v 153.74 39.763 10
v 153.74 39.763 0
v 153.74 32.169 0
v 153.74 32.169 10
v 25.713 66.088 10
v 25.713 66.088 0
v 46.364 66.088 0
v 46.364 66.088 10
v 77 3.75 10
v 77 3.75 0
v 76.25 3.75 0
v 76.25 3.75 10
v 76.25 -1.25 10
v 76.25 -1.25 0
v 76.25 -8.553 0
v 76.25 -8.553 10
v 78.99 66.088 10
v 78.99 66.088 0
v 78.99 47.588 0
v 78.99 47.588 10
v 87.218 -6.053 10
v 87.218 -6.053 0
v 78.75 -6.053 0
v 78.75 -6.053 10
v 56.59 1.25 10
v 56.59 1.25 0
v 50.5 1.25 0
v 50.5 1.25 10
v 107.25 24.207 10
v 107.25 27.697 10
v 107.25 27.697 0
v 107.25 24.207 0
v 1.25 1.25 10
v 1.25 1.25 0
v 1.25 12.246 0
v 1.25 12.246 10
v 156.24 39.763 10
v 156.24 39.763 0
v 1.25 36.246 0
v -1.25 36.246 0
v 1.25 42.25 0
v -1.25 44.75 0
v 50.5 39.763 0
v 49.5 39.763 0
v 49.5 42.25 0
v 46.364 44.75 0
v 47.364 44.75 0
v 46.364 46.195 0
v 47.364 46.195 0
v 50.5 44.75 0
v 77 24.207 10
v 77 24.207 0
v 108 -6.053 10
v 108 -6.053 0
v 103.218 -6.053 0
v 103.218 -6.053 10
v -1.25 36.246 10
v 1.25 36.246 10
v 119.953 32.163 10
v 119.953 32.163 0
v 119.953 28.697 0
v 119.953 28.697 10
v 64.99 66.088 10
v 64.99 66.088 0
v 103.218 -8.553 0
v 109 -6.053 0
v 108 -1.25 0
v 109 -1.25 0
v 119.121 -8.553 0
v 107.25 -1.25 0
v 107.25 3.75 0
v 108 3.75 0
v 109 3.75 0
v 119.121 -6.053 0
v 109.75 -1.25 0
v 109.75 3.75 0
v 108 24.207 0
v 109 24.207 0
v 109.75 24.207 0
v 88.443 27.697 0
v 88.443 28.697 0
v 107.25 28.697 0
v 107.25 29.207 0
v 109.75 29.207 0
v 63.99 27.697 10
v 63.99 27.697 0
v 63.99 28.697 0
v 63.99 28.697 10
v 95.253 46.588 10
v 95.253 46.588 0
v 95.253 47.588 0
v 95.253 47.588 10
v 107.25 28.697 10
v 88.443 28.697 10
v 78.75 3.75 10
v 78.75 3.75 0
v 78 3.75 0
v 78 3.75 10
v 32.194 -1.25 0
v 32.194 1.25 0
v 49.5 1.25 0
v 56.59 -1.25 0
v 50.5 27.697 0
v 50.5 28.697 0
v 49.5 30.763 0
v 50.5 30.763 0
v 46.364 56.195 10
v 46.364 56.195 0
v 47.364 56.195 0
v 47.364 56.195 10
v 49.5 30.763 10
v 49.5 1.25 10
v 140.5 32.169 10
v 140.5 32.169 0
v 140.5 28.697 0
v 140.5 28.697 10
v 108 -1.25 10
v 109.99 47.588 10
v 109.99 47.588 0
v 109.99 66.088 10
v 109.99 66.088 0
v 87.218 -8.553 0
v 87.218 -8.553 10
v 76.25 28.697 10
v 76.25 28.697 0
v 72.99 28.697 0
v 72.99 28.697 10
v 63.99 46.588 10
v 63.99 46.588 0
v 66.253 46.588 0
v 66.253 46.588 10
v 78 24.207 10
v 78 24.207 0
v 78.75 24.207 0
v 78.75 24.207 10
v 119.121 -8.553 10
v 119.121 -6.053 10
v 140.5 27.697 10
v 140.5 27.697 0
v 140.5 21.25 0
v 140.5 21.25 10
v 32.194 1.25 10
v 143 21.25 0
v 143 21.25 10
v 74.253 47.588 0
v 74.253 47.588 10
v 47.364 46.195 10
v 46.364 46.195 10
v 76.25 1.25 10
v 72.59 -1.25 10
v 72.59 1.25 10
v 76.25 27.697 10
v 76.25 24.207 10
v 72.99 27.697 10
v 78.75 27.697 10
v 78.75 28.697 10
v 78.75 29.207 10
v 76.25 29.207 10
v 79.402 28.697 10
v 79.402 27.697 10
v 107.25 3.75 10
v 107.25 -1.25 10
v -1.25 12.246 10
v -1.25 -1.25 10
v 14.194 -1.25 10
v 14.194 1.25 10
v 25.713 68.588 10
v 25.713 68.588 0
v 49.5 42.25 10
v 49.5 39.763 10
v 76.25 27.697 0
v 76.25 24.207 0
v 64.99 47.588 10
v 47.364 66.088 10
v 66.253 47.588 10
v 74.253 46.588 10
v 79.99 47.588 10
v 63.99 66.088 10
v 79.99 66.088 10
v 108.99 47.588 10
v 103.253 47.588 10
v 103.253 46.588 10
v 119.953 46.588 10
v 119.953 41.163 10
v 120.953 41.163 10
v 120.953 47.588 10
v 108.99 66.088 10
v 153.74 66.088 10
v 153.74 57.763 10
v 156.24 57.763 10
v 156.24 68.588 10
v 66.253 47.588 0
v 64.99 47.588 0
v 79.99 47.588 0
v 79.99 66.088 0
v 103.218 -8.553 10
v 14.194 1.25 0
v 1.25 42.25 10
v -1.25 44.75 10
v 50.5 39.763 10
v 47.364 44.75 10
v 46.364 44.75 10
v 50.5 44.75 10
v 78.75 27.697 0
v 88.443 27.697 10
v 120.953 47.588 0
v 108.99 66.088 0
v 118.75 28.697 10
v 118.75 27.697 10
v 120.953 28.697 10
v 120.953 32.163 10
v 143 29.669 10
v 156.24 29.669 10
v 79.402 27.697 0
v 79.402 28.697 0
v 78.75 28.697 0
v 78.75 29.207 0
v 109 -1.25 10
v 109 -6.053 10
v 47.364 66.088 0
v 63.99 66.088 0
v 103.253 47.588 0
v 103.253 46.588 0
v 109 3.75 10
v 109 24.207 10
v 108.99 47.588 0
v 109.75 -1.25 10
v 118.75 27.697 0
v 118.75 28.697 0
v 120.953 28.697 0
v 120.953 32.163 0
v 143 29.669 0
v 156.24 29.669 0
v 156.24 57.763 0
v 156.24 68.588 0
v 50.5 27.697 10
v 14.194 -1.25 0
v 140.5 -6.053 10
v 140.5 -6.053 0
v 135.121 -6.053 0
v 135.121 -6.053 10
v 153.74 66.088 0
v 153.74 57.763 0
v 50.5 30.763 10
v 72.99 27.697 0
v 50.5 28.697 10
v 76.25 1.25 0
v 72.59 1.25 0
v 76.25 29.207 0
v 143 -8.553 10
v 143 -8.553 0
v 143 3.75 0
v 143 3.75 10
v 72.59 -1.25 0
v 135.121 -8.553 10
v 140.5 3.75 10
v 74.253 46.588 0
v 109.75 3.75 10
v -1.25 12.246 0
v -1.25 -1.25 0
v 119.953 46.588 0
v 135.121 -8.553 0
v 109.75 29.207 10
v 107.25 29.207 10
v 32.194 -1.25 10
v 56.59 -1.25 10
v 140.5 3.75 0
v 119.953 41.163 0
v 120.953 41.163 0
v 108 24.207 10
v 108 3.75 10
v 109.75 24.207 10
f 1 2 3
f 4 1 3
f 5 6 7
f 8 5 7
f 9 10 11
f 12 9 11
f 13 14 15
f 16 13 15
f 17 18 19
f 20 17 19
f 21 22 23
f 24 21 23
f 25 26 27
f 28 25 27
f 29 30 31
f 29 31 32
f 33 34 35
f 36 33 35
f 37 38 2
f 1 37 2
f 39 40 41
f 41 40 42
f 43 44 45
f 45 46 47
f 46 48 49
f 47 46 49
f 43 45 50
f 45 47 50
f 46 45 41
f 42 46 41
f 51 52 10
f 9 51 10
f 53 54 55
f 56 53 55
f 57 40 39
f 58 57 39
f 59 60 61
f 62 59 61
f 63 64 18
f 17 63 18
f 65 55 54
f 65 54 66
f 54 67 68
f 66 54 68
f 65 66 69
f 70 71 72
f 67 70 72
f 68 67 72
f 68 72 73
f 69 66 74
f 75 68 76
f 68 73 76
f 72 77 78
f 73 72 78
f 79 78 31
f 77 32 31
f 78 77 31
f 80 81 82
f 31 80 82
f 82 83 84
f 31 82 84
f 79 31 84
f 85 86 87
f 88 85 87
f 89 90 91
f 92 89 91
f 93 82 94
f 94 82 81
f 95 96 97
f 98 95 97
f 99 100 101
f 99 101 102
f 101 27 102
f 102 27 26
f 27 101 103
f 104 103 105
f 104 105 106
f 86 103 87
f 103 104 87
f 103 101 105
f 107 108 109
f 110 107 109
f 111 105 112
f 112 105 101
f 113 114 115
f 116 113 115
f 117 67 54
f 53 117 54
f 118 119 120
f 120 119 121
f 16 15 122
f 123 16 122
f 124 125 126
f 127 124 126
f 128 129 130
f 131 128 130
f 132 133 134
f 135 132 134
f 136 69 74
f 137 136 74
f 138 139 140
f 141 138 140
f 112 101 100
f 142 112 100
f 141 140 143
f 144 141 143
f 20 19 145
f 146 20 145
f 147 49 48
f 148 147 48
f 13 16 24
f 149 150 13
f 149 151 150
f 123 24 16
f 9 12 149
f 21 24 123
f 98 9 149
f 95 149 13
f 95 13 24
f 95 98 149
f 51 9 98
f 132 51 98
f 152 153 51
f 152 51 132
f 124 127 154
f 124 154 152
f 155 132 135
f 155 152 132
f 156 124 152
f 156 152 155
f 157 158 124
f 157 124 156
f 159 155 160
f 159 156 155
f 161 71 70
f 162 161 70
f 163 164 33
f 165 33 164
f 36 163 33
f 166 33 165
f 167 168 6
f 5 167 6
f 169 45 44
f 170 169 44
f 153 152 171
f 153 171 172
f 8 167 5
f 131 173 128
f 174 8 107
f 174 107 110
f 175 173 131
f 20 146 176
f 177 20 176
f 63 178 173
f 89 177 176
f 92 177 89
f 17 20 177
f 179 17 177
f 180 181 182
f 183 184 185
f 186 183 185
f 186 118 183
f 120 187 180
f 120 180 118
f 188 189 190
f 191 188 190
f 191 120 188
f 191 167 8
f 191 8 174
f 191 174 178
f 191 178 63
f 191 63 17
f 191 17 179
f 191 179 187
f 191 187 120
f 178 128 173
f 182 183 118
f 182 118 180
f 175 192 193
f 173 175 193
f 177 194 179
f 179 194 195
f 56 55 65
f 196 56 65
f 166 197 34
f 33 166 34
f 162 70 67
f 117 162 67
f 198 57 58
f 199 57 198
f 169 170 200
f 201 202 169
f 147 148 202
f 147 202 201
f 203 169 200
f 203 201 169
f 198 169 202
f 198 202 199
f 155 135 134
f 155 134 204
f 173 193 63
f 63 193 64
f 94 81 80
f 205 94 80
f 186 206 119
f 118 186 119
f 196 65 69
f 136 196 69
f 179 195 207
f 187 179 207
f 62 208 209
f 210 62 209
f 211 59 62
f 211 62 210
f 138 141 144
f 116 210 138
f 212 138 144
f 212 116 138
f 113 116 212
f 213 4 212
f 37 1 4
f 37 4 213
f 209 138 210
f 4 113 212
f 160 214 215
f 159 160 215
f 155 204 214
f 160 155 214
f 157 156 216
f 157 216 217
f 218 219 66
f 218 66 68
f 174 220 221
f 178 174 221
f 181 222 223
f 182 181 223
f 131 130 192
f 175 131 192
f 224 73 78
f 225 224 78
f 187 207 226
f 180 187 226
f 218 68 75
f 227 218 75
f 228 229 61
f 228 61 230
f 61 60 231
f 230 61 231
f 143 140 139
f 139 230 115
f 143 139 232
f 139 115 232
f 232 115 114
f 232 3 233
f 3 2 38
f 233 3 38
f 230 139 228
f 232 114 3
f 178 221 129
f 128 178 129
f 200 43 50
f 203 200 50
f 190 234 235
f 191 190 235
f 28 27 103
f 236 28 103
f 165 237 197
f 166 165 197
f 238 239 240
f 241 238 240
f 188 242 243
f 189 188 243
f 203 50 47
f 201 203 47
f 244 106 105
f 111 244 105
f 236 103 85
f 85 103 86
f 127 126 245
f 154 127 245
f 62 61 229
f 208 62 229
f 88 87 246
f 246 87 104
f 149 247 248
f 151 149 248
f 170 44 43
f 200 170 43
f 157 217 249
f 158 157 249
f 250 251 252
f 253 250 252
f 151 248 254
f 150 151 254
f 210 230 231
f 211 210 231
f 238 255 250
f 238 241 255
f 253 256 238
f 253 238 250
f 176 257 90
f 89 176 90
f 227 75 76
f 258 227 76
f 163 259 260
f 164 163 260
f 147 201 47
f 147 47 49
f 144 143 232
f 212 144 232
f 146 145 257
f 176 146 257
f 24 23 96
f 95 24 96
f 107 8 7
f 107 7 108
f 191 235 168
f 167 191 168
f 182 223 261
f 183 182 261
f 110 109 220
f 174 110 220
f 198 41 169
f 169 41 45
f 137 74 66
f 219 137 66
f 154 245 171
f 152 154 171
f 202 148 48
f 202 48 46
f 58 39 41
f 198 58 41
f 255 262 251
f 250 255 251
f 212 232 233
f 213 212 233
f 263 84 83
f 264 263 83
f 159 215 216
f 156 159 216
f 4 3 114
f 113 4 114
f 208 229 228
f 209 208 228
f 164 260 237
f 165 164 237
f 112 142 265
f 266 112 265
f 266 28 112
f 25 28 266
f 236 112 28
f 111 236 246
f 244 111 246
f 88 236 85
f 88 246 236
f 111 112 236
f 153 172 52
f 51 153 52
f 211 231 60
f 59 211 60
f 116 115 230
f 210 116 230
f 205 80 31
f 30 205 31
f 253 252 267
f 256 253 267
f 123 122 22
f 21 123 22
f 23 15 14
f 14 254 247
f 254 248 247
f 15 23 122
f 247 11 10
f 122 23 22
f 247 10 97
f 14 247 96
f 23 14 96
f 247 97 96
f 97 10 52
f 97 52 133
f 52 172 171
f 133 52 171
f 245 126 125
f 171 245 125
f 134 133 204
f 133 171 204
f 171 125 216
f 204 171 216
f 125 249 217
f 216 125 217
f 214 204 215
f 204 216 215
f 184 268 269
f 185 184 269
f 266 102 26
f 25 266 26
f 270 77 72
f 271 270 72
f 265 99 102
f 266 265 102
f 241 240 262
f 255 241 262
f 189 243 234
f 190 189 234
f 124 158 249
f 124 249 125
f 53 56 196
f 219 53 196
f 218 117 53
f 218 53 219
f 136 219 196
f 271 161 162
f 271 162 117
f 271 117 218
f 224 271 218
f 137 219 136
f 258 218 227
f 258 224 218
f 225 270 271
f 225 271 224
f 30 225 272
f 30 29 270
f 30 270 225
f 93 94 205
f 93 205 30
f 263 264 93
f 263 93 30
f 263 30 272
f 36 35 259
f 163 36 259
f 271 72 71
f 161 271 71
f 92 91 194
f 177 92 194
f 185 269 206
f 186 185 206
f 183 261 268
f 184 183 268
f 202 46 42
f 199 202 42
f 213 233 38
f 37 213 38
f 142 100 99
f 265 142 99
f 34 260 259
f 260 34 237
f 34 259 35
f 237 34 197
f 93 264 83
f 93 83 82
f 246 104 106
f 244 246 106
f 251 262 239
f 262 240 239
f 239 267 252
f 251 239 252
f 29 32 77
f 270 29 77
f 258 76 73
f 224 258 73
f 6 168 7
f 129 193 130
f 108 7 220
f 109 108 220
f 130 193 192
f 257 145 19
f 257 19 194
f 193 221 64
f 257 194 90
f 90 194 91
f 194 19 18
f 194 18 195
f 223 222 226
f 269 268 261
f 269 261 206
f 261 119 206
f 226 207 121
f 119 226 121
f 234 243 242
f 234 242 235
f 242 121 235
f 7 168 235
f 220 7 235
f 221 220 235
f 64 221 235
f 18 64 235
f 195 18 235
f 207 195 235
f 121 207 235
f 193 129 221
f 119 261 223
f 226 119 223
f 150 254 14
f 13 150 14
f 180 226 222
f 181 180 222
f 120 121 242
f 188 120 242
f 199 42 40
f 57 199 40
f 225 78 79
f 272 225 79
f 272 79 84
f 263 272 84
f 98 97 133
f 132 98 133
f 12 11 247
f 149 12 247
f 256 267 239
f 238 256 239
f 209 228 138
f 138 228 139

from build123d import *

# Parameters (mm, degrees)
BOSS_EXTRUDE1_DEPTH   = 10
BOSS_EXTRUDE1_2_DEPTH = 10
BOSS_EXTRUDE1_3_DEPTH = 10
BOSS_EXTRUDE1_4_DEPTH = 10
BOSS_EXTRUDE1_5_DEPTH = 10
BOSS_EXTRUDE1_6_DEPTH = 10
BOSS_EXTRUDE1_7_DEPTH = 10
BOSS_EXTRUDE1_8_DEPTH = 10


with BuildPart() as part:
    # Sketch2 → Boss-Extrude1 (new body)
    with BuildSketch(Plane.XY):
        Polygon((1.25, 42.25), (49.5, 42.25), (49.5, 39.76289584), (50.5, 39.76289584), (50.5, 44.75), (47.364305552, 44.75), (47.364305552, 46.195174047), (46.364305552, 46.195174047), (46.364305552, 44.75), (-1.25, 44.75), (-1.25, 36.246112635), (1.25, 36.246112635), align=None)
    extrude(amount=BOSS_EXTRUDE1_DEPTH)


with BuildPart() as body_2:
    # Sketch2 → Boss-Extrude1 2 (new body)
    with BuildSketch(Plane.XY):
        Polygon((-1.25, 12.246112635), (-1.25, -1.25), (14.194440447, -1.25), (14.194440447, 1.25), (1.25, 1.25), (1.25, 12.246112635), align=None)
    extrude(amount=BOSS_EXTRUDE1_2_DEPTH)


with BuildPart() as body_3:
    # Sketch2 → Boss-Extrude1 3 (new body)
    with BuildSketch(Plane.XY):
        Polygon((56.590450533, 1.25), (50.5, 1.25), (50.5, 27.697429853), (63.990459014, 27.697429853), (63.990459014, 28.697429853), (50.5, 28.697429853), (50.5, 30.76289584), (49.5, 30.76289584), (49.5, 1.25), (32.194440447, 1.25), (32.194440447, -1.25), (56.590450533, -1.25), align=None)
    extrude(amount=BOSS_EXTRUDE1_3_DEPTH)


with BuildPart() as body_4:
    # Sketch2 → Boss-Extrude1 4 (new body)
    with BuildSketch(Plane.XY):
        Polygon((72.590450533, -1.25), (76.25, -1.25), (76.25, -8.552570147), (87.217668521, -8.552570147), (87.217668521, -6.052570147), (78.75, -6.052570147), (78.75, 3.75), (78, 3.75), (78, 24.206591876), (78.75, 24.206591876), (78.75, 27.697429853), (79.401701652, 27.697429853), (79.401701652, 28.697429853), (78.75, 28.697429853), (78.75, 29.206591876), (76.25, 29.206591876), (76.25, 28.697429853), (72.990459014, 28.697429853), (72.990459014, 27.697429853), (76.25, 27.697429853), (76.25, 24.206591876), (77, 24.206591876), (77, 3.75), (76.25, 3.75), (76.25, 1.25), (72.590450533, 1.25), align=None)
    extrude(amount=BOSS_EXTRUDE1_4_DEPTH)


with BuildPart() as body_5:
    # Sketch2 → Boss-Extrude1 5 (new body)
    with BuildSketch(Plane.XY):
        Polygon((119.121020592, -6.052570147), (109, -6.052570147), (109, -1.25), (109.75, -1.25), (109.75, 3.75), (109, 3.75), (109, 24.206591876), (109.75, 24.206591876), (109.75, 29.206591876), (107.25, 29.206591876), (107.25, 28.697429853), (88.442866465, 28.697429853), (88.442866465, 27.697429853), (107.25, 27.697429853), (107.25, 24.206591876), (108, 24.206591876), (108, 3.75), (107.25, 3.75), (107.25, -1.25), (108, -1.25), (108, -6.052570147), (103.217668521, -6.052570147), (103.217668521, -8.552570147), (119.121020592, -8.552570147), align=None)
    extrude(amount=BOSS_EXTRUDE1_5_DEPTH)


with BuildPart() as body_6:
    # Sketch2 → Boss-Extrude1 6 (new body)
    with BuildSketch(Plane.XY):
        Polygon((135.121020592, -8.552570147), (143, -8.552570147), (143, 3.75), (140.5, 3.75), (140.5, -6.052570147), (135.121020592, -6.052570147), align=None)
    extrude(amount=BOSS_EXTRUDE1_6_DEPTH)


with BuildPart() as body_7:
    # Sketch2 → Boss-Extrude1 7 (new body)
    with BuildSketch(Plane.XY):
        Polygon((140.5, 32.169046535), (140.5, 28.697429853), (120.953268871, 28.697429853), (120.953268871, 32.163060598), (119.953268871, 32.163060598), (119.953268871, 28.697429853), (118.75, 28.697429853), (118.75, 27.697429853), (140.5, 27.697429853), (140.5, 21.25), (143, 21.25), (143, 29.669046535), (156.240459014, 29.669046535), (156.240459014, 39.76289584), (153.740459014, 39.76289584), (153.740459014, 32.169046535), align=None)
    extrude(amount=BOSS_EXTRUDE1_7_DEPTH)


with BuildPart() as body_8:
    # Sketch2 → Boss-Extrude1 8 (new body)
    with BuildSketch(Plane.XY):
        Polygon((156.240459014, 68.58761226), (25.71255602, 68.58761226), (25.71255602, 66.08761226), (46.364305552, 66.08761226), (46.364305552, 56.195174047), (47.364305552, 56.195174047), (47.364305552, 66.08761226), (63.990459014, 66.08761226), (63.990459014, 46.58761226), (66.252757915, 46.58761226), (66.252757915, 47.58761226), (64.990459014, 47.58761226), (64.990459014, 66.08761226), (78.990459014, 66.08761226), (78.990459014, 47.58761226), (74.252757915, 47.58761226), (74.252757915, 46.58761226), (95.252902041, 46.58761226), (95.252902041, 47.58761226), (79.990459014, 47.58761226), (79.990459014, 66.08761226), (108.990459014, 66.08761226), (108.990459014, 47.58761226), (103.252902041, 47.58761226), (103.252902041, 46.58761226), (119.953268871, 46.58761226), (119.953268871, 41.163060598), (120.953268871, 41.163060598), (120.953268871, 47.58761226), (109.990459014, 47.58761226), (109.990459014, 66.08761226), (153.740459014, 66.08761226), (153.740459014, 57.76289584), (156.240459014, 57.76289584), align=None)
    extrude(amount=BOSS_EXTRUDE1_8_DEPTH)


solid = Compound([part.part, body_2.part, body_3.part, body_4.part, body_5.part, body_6.part, body_7.part, body_8.part])
